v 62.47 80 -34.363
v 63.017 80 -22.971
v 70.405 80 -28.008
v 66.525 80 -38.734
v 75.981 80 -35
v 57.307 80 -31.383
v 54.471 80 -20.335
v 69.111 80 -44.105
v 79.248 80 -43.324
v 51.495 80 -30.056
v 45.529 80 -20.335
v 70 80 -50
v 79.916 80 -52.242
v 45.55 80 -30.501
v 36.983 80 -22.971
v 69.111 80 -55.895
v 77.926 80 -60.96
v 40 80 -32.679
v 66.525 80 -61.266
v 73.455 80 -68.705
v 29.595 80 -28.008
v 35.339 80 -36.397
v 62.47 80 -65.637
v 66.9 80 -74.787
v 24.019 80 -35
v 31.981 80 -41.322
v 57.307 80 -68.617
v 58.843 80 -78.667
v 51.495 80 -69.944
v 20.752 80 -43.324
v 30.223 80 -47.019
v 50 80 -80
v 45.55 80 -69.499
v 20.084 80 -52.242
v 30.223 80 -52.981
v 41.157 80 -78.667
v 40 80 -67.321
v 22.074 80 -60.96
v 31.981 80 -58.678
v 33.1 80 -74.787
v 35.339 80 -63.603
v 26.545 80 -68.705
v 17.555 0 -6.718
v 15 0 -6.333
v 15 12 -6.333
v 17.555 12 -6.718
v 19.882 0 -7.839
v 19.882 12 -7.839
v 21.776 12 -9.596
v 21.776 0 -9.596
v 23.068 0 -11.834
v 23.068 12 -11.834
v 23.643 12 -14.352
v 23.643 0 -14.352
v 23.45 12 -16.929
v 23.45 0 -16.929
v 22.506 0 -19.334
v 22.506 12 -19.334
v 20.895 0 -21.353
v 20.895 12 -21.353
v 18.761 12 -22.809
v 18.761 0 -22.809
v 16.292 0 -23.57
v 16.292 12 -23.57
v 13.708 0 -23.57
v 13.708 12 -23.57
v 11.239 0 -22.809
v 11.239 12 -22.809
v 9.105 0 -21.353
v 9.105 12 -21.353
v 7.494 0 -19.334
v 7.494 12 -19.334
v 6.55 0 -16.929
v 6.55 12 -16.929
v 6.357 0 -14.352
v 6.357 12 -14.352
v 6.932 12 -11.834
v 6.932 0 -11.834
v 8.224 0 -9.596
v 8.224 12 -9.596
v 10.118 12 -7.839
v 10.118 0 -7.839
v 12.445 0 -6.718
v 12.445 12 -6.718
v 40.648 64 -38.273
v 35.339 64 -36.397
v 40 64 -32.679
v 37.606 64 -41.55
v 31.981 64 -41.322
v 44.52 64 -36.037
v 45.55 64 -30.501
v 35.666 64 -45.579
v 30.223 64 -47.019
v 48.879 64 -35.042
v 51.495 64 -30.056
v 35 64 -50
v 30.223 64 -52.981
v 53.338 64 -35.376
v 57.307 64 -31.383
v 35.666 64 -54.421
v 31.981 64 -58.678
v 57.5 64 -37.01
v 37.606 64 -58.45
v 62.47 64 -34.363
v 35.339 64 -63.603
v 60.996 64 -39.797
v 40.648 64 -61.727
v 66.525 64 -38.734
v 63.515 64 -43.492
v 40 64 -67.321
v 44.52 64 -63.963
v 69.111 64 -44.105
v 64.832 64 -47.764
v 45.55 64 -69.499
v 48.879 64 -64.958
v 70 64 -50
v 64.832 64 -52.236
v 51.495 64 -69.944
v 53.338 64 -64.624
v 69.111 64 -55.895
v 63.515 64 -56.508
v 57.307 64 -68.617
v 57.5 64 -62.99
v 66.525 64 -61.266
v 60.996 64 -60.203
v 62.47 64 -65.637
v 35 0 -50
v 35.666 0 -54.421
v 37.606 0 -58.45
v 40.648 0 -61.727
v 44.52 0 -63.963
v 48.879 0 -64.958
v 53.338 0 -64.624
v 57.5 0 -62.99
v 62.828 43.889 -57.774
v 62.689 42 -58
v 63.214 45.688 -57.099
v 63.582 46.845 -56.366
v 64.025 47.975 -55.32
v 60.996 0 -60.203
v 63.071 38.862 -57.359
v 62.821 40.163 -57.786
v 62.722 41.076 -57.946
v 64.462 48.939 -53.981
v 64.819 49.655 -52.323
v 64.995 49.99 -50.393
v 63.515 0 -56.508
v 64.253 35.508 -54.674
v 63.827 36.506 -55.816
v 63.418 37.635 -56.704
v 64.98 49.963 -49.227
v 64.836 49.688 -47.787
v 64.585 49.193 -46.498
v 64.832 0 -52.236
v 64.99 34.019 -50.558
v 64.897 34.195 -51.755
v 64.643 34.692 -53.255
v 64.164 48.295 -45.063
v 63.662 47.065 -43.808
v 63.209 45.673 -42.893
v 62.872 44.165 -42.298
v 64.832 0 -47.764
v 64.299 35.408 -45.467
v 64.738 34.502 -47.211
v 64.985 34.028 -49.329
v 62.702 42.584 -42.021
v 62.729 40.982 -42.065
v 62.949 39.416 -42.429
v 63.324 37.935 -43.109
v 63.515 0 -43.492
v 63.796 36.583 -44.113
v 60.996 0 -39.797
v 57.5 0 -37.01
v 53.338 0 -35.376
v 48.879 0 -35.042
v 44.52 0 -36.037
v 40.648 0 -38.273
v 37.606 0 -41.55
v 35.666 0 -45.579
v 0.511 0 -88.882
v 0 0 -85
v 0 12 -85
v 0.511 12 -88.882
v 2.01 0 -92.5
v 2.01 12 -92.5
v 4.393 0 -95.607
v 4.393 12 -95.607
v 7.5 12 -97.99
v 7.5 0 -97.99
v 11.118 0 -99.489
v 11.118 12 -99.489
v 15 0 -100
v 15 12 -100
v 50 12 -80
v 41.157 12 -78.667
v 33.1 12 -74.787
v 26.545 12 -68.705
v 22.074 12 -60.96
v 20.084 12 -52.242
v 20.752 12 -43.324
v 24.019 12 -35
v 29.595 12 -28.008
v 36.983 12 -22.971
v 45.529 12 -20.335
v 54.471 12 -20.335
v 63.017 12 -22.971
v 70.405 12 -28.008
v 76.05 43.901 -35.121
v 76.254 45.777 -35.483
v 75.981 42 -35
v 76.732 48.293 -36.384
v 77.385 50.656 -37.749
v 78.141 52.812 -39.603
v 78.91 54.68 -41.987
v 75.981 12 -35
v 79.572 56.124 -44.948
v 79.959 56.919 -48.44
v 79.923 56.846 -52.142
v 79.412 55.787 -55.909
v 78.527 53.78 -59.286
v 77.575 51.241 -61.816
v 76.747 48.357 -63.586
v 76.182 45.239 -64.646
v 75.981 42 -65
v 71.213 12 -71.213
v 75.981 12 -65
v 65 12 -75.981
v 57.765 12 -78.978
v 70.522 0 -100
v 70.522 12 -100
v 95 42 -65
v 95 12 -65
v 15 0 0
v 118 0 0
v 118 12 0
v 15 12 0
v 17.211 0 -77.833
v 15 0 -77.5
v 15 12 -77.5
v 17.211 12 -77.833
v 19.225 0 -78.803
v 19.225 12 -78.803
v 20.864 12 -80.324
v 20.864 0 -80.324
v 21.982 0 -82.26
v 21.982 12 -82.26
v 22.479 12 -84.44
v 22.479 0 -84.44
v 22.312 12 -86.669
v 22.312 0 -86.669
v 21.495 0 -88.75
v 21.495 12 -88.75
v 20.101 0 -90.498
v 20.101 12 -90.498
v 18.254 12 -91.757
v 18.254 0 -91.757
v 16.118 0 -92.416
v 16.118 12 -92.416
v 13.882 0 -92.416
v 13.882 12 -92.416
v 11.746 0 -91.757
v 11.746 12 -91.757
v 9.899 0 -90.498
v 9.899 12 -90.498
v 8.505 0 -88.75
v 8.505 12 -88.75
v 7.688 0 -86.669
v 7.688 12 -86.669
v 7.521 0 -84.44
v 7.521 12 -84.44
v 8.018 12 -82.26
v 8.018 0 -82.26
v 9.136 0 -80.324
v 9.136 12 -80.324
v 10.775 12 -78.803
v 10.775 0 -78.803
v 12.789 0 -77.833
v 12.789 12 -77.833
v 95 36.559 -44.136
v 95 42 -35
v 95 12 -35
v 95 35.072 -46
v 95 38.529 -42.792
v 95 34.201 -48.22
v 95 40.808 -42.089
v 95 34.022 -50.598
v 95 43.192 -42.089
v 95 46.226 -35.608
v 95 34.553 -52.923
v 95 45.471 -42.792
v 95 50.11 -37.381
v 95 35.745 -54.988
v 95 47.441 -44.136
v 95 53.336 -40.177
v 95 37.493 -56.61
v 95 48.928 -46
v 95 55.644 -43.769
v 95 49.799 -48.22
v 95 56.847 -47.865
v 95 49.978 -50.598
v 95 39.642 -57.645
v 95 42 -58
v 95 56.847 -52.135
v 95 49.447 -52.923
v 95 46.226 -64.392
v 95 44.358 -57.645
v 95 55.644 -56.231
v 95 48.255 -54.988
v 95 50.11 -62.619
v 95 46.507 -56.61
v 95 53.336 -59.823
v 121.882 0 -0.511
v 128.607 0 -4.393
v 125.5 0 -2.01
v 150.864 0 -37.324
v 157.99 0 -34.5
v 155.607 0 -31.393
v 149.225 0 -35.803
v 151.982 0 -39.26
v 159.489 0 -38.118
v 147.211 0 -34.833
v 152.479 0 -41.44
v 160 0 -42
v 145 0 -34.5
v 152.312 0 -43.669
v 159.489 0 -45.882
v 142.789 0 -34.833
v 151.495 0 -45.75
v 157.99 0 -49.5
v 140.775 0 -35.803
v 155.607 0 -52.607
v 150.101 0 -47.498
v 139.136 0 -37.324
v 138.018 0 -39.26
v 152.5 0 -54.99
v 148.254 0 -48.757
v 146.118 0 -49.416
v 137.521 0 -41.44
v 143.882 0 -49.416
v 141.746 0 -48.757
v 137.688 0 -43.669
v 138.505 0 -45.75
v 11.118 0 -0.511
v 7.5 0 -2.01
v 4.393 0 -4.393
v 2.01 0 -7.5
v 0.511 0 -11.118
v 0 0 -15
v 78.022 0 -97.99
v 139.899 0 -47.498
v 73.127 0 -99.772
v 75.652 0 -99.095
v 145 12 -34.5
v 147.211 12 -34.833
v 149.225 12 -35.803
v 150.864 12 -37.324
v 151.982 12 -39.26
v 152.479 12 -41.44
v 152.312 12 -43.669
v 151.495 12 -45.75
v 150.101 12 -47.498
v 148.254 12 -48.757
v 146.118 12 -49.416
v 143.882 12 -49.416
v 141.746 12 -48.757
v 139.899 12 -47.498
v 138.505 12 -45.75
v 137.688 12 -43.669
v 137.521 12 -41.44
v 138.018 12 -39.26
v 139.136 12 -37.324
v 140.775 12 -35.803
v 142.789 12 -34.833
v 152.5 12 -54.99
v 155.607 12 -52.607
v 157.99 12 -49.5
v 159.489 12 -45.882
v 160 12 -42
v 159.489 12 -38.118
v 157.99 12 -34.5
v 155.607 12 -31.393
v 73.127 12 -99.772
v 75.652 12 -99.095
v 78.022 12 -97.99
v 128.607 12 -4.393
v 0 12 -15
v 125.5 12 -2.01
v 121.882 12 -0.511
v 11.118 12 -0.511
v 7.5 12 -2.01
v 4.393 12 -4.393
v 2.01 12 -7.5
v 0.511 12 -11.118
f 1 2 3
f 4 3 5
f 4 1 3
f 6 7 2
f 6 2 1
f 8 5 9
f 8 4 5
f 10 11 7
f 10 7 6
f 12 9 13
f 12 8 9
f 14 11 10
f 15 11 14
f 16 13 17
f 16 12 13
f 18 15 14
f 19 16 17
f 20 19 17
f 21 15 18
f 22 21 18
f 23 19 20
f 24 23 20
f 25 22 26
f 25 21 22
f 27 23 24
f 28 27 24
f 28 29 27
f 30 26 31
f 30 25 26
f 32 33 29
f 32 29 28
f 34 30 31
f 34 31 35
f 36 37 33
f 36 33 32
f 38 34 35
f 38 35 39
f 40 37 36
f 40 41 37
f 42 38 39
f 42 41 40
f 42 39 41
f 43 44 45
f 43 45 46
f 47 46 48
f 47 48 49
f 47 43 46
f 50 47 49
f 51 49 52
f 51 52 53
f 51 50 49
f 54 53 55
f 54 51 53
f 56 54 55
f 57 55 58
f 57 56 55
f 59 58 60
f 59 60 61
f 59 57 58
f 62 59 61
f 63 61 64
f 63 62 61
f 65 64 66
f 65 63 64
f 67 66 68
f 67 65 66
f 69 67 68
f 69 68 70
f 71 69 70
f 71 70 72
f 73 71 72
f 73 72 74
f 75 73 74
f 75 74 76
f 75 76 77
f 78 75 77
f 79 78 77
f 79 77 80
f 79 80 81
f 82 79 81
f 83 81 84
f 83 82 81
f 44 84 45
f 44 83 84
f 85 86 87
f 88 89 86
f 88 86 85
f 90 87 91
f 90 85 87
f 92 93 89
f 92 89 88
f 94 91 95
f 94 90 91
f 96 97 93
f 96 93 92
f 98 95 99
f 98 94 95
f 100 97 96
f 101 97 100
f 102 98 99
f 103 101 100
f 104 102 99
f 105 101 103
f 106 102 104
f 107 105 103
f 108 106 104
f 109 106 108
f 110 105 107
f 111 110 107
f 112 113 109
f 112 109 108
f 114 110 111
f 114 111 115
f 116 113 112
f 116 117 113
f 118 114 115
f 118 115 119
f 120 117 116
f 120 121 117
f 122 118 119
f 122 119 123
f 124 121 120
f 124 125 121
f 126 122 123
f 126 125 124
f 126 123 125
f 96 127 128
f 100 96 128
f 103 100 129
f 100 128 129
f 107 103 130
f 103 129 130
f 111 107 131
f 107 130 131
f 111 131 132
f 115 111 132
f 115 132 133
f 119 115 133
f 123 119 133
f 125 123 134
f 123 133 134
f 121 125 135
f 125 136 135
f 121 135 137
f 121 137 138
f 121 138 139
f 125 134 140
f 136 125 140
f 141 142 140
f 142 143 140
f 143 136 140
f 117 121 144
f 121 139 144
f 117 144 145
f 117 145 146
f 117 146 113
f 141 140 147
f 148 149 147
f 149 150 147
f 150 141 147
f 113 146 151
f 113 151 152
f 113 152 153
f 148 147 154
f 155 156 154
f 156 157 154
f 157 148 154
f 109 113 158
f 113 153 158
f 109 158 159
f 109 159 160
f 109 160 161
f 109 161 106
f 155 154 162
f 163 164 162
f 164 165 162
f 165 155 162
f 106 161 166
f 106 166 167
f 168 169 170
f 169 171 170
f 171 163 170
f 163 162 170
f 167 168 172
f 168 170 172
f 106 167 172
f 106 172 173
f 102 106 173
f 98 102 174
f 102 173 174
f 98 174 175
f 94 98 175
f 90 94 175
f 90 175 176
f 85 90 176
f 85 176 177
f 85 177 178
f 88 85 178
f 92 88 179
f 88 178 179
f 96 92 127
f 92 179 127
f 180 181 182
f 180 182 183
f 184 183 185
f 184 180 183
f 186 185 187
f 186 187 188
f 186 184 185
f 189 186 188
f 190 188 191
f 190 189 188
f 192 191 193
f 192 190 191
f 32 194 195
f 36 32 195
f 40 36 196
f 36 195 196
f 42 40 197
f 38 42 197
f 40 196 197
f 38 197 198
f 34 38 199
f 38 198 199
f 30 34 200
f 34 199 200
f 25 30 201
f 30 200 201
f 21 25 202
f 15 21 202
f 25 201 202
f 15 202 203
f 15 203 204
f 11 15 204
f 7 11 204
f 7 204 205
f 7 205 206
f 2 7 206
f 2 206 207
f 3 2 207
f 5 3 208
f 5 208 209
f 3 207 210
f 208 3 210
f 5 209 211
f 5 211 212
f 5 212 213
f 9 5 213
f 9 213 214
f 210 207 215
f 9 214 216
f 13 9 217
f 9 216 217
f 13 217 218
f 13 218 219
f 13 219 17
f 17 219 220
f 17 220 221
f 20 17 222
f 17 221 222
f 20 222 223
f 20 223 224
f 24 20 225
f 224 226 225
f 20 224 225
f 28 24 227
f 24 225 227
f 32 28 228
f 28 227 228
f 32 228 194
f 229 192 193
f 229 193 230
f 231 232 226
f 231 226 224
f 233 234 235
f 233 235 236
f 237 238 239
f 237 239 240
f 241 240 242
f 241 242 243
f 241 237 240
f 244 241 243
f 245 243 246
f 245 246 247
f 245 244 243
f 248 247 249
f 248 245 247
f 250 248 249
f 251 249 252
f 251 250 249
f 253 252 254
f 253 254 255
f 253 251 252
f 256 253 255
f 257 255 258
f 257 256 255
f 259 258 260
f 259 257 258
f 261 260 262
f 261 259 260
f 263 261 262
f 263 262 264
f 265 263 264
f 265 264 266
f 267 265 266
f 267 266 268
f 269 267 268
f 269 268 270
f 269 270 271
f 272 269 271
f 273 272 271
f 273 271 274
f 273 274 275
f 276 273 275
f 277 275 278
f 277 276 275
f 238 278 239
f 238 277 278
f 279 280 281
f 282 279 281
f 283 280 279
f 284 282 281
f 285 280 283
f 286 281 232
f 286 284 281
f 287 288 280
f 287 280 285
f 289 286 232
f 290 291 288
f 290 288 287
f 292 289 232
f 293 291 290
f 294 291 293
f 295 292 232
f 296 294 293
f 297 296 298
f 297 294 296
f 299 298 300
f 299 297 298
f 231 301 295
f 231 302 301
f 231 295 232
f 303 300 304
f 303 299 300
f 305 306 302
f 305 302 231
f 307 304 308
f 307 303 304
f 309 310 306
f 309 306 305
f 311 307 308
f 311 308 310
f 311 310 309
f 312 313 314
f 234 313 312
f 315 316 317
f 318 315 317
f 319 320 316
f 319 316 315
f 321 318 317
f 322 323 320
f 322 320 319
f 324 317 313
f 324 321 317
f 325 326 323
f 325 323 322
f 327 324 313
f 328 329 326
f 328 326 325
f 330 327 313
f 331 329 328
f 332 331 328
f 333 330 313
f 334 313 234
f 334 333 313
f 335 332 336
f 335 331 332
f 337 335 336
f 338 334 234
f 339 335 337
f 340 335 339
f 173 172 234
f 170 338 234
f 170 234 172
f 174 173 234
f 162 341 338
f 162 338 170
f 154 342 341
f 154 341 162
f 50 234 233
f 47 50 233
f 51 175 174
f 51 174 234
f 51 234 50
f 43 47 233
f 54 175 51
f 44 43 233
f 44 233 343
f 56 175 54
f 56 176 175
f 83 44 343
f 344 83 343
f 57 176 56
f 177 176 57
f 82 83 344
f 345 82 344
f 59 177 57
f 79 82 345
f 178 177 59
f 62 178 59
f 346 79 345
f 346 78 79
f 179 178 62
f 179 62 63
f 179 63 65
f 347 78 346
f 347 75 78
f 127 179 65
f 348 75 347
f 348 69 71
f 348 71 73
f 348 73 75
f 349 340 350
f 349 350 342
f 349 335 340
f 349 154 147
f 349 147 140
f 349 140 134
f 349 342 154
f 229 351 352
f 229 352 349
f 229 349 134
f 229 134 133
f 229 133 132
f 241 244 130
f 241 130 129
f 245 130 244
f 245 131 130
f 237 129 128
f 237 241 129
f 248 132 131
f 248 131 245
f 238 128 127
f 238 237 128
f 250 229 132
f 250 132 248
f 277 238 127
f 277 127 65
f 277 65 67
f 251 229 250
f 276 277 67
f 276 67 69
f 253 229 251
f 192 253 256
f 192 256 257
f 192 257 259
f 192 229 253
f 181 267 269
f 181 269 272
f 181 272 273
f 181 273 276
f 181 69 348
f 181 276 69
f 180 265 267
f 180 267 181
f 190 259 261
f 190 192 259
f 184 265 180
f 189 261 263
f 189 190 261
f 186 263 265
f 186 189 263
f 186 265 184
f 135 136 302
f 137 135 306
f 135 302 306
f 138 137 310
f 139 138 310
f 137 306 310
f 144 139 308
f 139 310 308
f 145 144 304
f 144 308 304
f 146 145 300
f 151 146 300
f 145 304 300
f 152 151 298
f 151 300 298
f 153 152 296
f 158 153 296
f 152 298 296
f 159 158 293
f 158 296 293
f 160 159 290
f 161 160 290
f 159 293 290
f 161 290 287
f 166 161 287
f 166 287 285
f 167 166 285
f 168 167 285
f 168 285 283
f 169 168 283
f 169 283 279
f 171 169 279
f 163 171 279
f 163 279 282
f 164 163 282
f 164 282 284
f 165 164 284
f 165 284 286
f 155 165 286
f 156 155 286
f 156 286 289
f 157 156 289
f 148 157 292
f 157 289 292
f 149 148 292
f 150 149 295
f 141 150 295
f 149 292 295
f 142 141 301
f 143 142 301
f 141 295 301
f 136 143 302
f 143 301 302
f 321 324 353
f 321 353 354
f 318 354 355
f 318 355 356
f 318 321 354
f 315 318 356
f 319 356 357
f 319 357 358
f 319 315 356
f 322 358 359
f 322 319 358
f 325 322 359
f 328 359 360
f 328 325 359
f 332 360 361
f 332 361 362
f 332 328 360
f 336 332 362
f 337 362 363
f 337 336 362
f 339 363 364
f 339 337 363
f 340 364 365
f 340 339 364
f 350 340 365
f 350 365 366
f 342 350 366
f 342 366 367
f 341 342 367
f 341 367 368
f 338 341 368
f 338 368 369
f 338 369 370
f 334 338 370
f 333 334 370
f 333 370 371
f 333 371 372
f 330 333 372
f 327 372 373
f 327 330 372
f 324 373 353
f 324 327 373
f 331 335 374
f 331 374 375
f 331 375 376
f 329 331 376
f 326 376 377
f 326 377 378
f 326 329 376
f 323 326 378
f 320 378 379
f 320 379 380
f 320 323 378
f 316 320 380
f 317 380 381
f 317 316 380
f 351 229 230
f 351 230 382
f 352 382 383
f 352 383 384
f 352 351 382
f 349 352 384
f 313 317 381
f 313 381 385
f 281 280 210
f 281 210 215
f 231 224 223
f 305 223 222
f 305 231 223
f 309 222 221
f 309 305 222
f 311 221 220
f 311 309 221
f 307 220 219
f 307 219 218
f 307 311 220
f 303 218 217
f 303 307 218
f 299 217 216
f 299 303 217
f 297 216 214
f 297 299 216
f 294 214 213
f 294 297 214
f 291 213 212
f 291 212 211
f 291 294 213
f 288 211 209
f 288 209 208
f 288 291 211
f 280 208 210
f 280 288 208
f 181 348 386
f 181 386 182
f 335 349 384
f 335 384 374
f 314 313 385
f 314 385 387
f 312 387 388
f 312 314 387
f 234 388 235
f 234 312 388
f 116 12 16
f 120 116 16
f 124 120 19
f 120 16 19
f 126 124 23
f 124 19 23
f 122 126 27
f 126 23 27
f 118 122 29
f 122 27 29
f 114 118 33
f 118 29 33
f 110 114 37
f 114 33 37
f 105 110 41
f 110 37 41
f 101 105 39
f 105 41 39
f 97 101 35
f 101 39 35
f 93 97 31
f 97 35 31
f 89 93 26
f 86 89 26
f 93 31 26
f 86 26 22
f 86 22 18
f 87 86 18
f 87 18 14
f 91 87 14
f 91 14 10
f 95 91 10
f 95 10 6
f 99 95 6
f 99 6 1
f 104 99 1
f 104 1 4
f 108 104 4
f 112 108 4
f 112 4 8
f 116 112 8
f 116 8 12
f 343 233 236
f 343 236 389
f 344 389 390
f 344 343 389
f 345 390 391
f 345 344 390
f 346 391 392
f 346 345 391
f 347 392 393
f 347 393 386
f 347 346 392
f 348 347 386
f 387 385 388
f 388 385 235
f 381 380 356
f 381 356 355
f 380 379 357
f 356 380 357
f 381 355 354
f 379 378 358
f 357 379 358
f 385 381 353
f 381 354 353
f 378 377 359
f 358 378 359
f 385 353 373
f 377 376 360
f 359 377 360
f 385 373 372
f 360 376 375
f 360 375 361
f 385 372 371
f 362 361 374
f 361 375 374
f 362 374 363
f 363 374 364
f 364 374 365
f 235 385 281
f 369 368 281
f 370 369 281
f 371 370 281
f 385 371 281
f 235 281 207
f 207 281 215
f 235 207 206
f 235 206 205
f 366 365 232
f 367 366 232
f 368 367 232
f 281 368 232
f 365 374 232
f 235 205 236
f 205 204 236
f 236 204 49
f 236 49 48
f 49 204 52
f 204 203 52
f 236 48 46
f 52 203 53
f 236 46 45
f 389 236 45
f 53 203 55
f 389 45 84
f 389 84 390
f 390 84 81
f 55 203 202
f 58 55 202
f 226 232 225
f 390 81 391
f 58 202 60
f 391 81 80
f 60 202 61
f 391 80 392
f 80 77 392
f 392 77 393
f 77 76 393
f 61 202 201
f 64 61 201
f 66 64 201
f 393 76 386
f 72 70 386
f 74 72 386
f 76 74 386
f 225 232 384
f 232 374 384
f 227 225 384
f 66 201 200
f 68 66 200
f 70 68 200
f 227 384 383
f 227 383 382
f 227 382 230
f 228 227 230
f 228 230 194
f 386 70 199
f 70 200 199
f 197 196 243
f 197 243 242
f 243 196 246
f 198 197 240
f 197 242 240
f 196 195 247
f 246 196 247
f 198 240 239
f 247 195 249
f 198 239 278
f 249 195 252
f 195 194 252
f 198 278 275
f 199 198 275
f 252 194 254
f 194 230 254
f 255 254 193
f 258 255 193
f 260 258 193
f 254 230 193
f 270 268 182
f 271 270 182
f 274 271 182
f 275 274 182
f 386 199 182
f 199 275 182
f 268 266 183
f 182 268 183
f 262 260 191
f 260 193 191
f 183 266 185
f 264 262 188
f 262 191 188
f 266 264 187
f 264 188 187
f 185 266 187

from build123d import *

# Parameters (mm, degrees)
SKETCH1_R                = 7.5
SKETCH1_R_2              = 8.667102454
BOSS_EXTRUDE1_DEPTH      = 12
SKETCH2_R                = 30
BOSS_EXTRUDE2_DEPTH      = 68
HOLE1_D                  = 30
HOLE1_DEPTH              = 80
HOLE1_CBORE_D            = 40
HOLE1_CBORE_DEPTH        = 16
HOLE1_TIP                = 9.012909285
BOSS_EXTRUDE3_REACH      = 161.452
BOSS_EXTRUDE3_END_RADIUS = 30
CUT_EXTRUDE1_REACH       = 161.452
CUT_EXTRUDE1_END_RADIUS  = 15
SKETCH7_R                = 8


with BuildPart() as part:
    # Sketch1 → Boss-Extrude1 (new body)
    with BuildSketch(Plane(origin=(0, 0, 0), x_dir=(1, 0, 0), z_dir=(0, 1, 0))):
        with BuildLine():
            Line((0, 15), (0, 85))
            ThreePointArc((0, 85), (4.393398282, 95.606601718), (15, 100))
            Line((15, 100), (70.521815275, 100))
            ThreePointArc((70.521815275, 100), (74.404100951, 99.488887394), (78.021815275, 97.990381057))
            Line((78.021815275, 97.990381057), (152.5, 54.990381057))
            ThreePointArc((152.5, 54.990381057), (159.871672921, 43.957892883), (155.606601718, 31.393398282))
            Line((155.606601718, 31.393398282), (128.606601718, 4.393398282))
            ThreePointArc((128.606601718, 4.393398282), (123.740251485, 1.141807012), (118, 0))
            Line((118, 0), (15, 0))
            ThreePointArc((15, 0), (4.393398282, 4.393398282), (0, 15))
        make_face()
        with Locations(Location((15, 85, 0), (0, 0, 270))):
            Circle(SKETCH1_R, mode=Mode.SUBTRACT)
        with Locations(Location((15, 15, 0), (0, 0, 270))):
            Circle(SKETCH1_R_2, mode=Mode.SUBTRACT)
        with Locations(Location((145, 42, 0), (0, 0, 270))):
            Circle(SKETCH1_R, mode=Mode.SUBTRACT)
    extrude(amount=BOSS_EXTRUDE1_DEPTH)

    # Sketch2 → Boss-Extrude2 (add)
    with BuildSketch(Plane(origin=(0, 12, 0), x_dir=(1, 0, 0), z_dir=(0, 1, 0))):
        with Locations(Location((50, 50, 0), (0, 0, 90))):
            Circle(SKETCH2_R)
    extrude(amount=BOSS_EXTRUDE2_DEPTH)

    # Hole1
    with Locations(Plane(origin=(0, 80, 0), x_dir=(1, 0, 0), z_dir=(0, 1, 0))):
        with Locations((50, 50)):
            CounterBoreHole(HOLE1_D / 2, HOLE1_CBORE_D / 2, HOLE1_CBORE_DEPTH, depth=HOLE1_DEPTH)
            with Locations((0, 0, -(HOLE1_DEPTH + HOLE1_TIP / 2))):  # 118° drill point
                Cone(0, HOLE1_D / 2, HOLE1_TIP, mode=Mode.SUBTRACT)

    # Boss-Extrude3: up to this cylinder (the profile starts outside it)
    boss_extrude3_end = Plane(origin=(50, 33.024623, -50), z_dir=(0, -1, 0)) * Cylinder(BOSS_EXTRUDE3_END_RADIUS, 383.904, mode=Mode.PRIVATE)
    # Sketch6 → Boss-Extrude3 (add, up to the surface)
    with BuildSketch(Plane(origin=(95, 0, 0), x_dir=(0, 0, -1), z_dir=(1, 0, 0)), mode=Mode.PRIVATE) as boss_extrude3_sk1:
        with BuildLine():
            Line((35, 42), (35, 12))
            Line((35, 12), (65, 12))
            Line((65, 12), (65, 42))
            ThreePointArc((65, 42), (50, 57), (35, 42))
        make_face()
    boss_extrude3_tool1 = extrude(boss_extrude3_sk1.sketch, amount=-BOSS_EXTRUDE3_REACH, mode=Mode.PRIVATE) - boss_extrude3_end
    add(boss_extrude3_tool1.solids().sort_by_distance((95, 33.024623, -50))[0])

    # Cut-Extrude1: up to this cylinder (the profile starts outside it)
    cut_extrude1_end = Plane(origin=(50, 42, -50), z_dir=(0, 1, 0)) * Cylinder(CUT_EXTRUDE1_END_RADIUS, 353.904, mode=Mode.PRIVATE)
    # Sketch7 → Cut-Extrude1 (cut, up to the surface)
    with BuildSketch(Plane(origin=(95, 0, 0), x_dir=(0, 0, -1), z_dir=(1, 0, 0)), mode=Mode.PRIVATE) as cut_extrude1_sk1:
        with Locations((50, 42)):
            Circle(SKETCH7_R)
    cut_extrude1_tool1 = extrude(cut_extrude1_sk1.sketch, amount=-CUT_EXTRUDE1_REACH, mode=Mode.PRIVATE) - cut_extrude1_end
    add(cut_extrude1_tool1.solids().sort_by_distance((95, 42, -50))[0], mode=Mode.SUBTRACT)


solid = part.part
